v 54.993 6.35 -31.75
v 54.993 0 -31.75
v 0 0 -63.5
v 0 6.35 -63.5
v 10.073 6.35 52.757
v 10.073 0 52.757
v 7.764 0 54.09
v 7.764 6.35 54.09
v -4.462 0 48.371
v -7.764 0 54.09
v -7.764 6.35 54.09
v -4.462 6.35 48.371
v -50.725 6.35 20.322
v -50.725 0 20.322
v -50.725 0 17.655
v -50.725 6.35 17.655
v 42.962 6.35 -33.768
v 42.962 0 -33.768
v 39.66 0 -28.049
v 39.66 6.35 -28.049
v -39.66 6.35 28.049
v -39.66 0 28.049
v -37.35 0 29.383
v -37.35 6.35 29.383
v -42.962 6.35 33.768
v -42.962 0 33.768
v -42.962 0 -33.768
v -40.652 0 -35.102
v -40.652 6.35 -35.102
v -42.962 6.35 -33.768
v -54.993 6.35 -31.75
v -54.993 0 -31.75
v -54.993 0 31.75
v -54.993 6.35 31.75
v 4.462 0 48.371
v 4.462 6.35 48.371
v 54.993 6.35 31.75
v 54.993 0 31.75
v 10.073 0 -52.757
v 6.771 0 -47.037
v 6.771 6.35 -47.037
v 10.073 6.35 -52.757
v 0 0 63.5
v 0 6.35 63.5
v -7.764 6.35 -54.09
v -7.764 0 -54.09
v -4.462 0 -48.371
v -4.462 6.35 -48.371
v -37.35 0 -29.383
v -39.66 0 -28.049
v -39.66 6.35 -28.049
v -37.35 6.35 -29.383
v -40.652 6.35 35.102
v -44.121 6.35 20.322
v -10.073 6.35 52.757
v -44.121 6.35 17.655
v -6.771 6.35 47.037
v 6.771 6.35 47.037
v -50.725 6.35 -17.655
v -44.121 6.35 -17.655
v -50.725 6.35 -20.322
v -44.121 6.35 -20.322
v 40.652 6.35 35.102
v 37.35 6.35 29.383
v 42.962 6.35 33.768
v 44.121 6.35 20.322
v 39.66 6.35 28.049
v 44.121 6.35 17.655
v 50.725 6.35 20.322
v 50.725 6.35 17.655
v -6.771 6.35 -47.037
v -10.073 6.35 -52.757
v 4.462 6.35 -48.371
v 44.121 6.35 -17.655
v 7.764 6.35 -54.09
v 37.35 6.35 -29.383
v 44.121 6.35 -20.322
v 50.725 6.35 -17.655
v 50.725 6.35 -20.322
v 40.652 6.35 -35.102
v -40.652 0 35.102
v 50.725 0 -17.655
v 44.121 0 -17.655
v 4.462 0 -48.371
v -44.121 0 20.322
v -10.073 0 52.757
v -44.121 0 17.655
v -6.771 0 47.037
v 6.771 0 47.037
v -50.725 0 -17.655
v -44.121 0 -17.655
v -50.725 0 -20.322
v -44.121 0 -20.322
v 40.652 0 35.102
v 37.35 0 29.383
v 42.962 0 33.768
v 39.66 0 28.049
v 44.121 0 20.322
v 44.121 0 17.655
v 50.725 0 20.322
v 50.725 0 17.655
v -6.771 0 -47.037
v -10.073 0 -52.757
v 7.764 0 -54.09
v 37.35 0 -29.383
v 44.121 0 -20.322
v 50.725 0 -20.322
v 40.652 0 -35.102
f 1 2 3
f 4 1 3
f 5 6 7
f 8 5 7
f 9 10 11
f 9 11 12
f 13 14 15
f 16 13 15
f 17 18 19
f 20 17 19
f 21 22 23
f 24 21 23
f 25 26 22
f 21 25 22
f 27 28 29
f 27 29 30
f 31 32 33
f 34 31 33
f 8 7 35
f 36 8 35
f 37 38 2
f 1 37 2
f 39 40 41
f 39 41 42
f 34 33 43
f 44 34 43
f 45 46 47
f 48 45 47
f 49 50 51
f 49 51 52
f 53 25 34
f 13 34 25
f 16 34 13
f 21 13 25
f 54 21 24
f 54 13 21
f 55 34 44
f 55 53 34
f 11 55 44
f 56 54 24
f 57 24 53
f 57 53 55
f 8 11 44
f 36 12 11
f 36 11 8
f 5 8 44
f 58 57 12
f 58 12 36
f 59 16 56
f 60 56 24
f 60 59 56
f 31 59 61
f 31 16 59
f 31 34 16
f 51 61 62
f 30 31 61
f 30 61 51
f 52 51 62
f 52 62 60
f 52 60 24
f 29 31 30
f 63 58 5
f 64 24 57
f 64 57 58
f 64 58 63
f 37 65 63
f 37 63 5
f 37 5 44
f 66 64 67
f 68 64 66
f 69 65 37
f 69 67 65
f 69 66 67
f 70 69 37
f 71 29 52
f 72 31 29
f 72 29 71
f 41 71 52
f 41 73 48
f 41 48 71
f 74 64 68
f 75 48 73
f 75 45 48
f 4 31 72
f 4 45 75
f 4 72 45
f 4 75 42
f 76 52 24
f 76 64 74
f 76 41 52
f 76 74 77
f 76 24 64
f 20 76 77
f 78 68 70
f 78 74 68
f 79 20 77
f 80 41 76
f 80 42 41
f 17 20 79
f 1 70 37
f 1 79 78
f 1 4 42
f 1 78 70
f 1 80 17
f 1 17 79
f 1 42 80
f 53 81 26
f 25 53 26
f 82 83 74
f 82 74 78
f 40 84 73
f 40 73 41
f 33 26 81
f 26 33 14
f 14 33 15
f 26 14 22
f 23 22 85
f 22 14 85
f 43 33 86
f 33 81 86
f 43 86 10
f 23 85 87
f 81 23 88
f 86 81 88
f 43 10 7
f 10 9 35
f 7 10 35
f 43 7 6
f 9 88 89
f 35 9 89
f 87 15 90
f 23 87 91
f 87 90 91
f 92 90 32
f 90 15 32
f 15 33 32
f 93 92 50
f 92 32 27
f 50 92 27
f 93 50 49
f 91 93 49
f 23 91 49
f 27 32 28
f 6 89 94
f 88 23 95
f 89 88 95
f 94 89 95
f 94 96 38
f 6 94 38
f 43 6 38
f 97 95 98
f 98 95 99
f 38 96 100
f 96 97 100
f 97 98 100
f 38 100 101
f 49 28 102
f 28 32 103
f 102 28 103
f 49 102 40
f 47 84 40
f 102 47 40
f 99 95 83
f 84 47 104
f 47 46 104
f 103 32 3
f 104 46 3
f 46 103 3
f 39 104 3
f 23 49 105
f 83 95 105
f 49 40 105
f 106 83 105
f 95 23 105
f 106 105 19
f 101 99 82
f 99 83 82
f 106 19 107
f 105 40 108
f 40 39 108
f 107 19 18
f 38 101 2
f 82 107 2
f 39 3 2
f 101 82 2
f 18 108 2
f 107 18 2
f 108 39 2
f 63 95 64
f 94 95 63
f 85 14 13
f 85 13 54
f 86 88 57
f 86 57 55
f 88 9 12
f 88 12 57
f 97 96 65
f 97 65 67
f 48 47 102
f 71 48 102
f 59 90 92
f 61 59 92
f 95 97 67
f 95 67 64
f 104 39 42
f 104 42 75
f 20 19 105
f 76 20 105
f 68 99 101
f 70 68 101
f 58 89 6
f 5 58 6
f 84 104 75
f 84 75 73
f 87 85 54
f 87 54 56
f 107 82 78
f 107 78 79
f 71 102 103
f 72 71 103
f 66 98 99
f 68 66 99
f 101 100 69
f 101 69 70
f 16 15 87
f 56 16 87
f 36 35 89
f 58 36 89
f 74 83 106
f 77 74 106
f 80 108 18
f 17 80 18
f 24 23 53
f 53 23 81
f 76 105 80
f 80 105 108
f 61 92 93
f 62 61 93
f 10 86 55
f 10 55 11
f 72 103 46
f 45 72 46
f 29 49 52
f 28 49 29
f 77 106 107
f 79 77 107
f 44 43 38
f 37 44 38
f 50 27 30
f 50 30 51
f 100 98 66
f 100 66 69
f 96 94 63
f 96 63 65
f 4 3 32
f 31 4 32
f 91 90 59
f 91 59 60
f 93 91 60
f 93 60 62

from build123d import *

# Parameters (mm, degrees)
SKETCH1_W           = 6.604
SKETCH1_H           = 2.667
BOSS_EXTRUDE1_DEPTH = 6.35


with BuildPart() as part:
    # Sketch1 → Boss-Extrude1 (new body)
    with BuildSketch(Plane(origin=(0, 0, 0), x_dir=(1, 0, 0), z_dir=(0, 1, 0))):
        Polygon((54.99261314, 31.75), (0, 63.5), (-54.99261314, 31.75), (-54.99261314, -31.75), (0, -63.5), (54.99261314, -31.75), align=None)
        Polygon((-42.961556491, 33.768423119), (-39.659556491, 28.049191352), (-37.349866739, 29.382691352), (-40.651866739, 35.101923119), align=None, mode=Mode.SUBTRACT)
        with Locations((-47.423090512, 18.988087748)):
            Rectangle(SKETCH1_W, SKETCH1_H, mode=Mode.SUBTRACT)
        Polygon((-10.073223773, 52.756510867), (-7.763534021, 54.090010867), (-4.461534021, 48.3707791), (-6.771223773, 47.0372791), align=None, mode=Mode.SUBTRACT)
        Polygon((7.763534021, 54.090010867), (4.461534021, 48.3707791), (6.771223773, 47.0372791), (10.073223773, 52.756510867), align=None, mode=Mode.SUBTRACT)
        Polygon((40.651866739, 35.101923119), (42.961556491, 33.768423119), (39.659556491, 28.049191352), (37.349866739, 29.382691352), align=None, mode=Mode.SUBTRACT)
        with Locations((47.423090512, 18.988087748)):
            Rectangle(SKETCH1_W, SKETCH1_H, mode=Mode.SUBTRACT)
        with Locations((47.423090512, -18.988087748)):
            Rectangle(SKETCH1_W, SKETCH1_H, mode=Mode.SUBTRACT)
        Polygon((42.961556491, -33.768423119), (39.659556491, -28.049191352), (37.349866739, -29.382691352), (40.651866739, -35.101923119), align=None, mode=Mode.SUBTRACT)
        Polygon((10.073223773, -52.756510867), (7.763534021, -54.090010867), (4.461534021, -48.3707791), (6.771223773, -47.0372791), align=None, mode=Mode.SUBTRACT)
        Polygon((-7.763534021, -54.090010867), (-4.461534021, -48.3707791), (-6.771223773, -47.0372791), (-10.073223773, -52.756510867), align=None, mode=Mode.SUBTRACT)
        Polygon((-40.651866739, -35.101923119), (-42.961556491, -33.768423119), (-39.659556491, -28.049191352), (-37.349866739, -29.382691352), align=None, mode=Mode.SUBTRACT)
        with Locations((-47.423090512, -18.988087748)):
            Rectangle(SKETCH1_W, SKETCH1_H, mode=Mode.SUBTRACT)
    extrude(amount=BOSS_EXTRUDE1_DEPTH)


solid = part.part
